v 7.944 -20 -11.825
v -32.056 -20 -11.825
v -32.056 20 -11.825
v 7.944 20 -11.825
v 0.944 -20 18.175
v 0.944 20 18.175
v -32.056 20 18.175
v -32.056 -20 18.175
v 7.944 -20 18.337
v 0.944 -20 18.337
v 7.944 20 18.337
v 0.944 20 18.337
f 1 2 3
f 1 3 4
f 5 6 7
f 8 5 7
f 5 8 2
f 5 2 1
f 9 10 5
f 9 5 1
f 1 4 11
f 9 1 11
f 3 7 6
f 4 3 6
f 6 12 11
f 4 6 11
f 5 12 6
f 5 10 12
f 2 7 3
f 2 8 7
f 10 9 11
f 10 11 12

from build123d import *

# Parameters (mm, degrees)
F0_W     = 26
F0_H     = 23
F0_H_2   = 7
F1_DEPTH = 20


with BuildPart() as f1:
    # F0 (on Front) → F1 (new body, symmetric)
    with BuildSketch(Plane.XZ):
        Polygon((-25.056261, 18.174567), (-32.056261, 18.174567), (-32.056261, -11.825433), (-25.056261, -11.825433), (-25.056261, -4.825433), align=None)
        with Locations((-12.056261, 6.674567)):
            Rectangle(F0_W, F0_H)
        with Locations((-12.056261, -8.325433)):
            Rectangle(F0_W, F0_H_2)
        Polygon((0.943739, 18.336729), (0.943739, 18.174567), (0.943739, -4.825433), (0.943739, -11.825433), (7.943739, -11.825433), (7.943739, 18.336729), align=None)
    extrude(amount=F1_DEPTH, both=True)


solid = f1.part
